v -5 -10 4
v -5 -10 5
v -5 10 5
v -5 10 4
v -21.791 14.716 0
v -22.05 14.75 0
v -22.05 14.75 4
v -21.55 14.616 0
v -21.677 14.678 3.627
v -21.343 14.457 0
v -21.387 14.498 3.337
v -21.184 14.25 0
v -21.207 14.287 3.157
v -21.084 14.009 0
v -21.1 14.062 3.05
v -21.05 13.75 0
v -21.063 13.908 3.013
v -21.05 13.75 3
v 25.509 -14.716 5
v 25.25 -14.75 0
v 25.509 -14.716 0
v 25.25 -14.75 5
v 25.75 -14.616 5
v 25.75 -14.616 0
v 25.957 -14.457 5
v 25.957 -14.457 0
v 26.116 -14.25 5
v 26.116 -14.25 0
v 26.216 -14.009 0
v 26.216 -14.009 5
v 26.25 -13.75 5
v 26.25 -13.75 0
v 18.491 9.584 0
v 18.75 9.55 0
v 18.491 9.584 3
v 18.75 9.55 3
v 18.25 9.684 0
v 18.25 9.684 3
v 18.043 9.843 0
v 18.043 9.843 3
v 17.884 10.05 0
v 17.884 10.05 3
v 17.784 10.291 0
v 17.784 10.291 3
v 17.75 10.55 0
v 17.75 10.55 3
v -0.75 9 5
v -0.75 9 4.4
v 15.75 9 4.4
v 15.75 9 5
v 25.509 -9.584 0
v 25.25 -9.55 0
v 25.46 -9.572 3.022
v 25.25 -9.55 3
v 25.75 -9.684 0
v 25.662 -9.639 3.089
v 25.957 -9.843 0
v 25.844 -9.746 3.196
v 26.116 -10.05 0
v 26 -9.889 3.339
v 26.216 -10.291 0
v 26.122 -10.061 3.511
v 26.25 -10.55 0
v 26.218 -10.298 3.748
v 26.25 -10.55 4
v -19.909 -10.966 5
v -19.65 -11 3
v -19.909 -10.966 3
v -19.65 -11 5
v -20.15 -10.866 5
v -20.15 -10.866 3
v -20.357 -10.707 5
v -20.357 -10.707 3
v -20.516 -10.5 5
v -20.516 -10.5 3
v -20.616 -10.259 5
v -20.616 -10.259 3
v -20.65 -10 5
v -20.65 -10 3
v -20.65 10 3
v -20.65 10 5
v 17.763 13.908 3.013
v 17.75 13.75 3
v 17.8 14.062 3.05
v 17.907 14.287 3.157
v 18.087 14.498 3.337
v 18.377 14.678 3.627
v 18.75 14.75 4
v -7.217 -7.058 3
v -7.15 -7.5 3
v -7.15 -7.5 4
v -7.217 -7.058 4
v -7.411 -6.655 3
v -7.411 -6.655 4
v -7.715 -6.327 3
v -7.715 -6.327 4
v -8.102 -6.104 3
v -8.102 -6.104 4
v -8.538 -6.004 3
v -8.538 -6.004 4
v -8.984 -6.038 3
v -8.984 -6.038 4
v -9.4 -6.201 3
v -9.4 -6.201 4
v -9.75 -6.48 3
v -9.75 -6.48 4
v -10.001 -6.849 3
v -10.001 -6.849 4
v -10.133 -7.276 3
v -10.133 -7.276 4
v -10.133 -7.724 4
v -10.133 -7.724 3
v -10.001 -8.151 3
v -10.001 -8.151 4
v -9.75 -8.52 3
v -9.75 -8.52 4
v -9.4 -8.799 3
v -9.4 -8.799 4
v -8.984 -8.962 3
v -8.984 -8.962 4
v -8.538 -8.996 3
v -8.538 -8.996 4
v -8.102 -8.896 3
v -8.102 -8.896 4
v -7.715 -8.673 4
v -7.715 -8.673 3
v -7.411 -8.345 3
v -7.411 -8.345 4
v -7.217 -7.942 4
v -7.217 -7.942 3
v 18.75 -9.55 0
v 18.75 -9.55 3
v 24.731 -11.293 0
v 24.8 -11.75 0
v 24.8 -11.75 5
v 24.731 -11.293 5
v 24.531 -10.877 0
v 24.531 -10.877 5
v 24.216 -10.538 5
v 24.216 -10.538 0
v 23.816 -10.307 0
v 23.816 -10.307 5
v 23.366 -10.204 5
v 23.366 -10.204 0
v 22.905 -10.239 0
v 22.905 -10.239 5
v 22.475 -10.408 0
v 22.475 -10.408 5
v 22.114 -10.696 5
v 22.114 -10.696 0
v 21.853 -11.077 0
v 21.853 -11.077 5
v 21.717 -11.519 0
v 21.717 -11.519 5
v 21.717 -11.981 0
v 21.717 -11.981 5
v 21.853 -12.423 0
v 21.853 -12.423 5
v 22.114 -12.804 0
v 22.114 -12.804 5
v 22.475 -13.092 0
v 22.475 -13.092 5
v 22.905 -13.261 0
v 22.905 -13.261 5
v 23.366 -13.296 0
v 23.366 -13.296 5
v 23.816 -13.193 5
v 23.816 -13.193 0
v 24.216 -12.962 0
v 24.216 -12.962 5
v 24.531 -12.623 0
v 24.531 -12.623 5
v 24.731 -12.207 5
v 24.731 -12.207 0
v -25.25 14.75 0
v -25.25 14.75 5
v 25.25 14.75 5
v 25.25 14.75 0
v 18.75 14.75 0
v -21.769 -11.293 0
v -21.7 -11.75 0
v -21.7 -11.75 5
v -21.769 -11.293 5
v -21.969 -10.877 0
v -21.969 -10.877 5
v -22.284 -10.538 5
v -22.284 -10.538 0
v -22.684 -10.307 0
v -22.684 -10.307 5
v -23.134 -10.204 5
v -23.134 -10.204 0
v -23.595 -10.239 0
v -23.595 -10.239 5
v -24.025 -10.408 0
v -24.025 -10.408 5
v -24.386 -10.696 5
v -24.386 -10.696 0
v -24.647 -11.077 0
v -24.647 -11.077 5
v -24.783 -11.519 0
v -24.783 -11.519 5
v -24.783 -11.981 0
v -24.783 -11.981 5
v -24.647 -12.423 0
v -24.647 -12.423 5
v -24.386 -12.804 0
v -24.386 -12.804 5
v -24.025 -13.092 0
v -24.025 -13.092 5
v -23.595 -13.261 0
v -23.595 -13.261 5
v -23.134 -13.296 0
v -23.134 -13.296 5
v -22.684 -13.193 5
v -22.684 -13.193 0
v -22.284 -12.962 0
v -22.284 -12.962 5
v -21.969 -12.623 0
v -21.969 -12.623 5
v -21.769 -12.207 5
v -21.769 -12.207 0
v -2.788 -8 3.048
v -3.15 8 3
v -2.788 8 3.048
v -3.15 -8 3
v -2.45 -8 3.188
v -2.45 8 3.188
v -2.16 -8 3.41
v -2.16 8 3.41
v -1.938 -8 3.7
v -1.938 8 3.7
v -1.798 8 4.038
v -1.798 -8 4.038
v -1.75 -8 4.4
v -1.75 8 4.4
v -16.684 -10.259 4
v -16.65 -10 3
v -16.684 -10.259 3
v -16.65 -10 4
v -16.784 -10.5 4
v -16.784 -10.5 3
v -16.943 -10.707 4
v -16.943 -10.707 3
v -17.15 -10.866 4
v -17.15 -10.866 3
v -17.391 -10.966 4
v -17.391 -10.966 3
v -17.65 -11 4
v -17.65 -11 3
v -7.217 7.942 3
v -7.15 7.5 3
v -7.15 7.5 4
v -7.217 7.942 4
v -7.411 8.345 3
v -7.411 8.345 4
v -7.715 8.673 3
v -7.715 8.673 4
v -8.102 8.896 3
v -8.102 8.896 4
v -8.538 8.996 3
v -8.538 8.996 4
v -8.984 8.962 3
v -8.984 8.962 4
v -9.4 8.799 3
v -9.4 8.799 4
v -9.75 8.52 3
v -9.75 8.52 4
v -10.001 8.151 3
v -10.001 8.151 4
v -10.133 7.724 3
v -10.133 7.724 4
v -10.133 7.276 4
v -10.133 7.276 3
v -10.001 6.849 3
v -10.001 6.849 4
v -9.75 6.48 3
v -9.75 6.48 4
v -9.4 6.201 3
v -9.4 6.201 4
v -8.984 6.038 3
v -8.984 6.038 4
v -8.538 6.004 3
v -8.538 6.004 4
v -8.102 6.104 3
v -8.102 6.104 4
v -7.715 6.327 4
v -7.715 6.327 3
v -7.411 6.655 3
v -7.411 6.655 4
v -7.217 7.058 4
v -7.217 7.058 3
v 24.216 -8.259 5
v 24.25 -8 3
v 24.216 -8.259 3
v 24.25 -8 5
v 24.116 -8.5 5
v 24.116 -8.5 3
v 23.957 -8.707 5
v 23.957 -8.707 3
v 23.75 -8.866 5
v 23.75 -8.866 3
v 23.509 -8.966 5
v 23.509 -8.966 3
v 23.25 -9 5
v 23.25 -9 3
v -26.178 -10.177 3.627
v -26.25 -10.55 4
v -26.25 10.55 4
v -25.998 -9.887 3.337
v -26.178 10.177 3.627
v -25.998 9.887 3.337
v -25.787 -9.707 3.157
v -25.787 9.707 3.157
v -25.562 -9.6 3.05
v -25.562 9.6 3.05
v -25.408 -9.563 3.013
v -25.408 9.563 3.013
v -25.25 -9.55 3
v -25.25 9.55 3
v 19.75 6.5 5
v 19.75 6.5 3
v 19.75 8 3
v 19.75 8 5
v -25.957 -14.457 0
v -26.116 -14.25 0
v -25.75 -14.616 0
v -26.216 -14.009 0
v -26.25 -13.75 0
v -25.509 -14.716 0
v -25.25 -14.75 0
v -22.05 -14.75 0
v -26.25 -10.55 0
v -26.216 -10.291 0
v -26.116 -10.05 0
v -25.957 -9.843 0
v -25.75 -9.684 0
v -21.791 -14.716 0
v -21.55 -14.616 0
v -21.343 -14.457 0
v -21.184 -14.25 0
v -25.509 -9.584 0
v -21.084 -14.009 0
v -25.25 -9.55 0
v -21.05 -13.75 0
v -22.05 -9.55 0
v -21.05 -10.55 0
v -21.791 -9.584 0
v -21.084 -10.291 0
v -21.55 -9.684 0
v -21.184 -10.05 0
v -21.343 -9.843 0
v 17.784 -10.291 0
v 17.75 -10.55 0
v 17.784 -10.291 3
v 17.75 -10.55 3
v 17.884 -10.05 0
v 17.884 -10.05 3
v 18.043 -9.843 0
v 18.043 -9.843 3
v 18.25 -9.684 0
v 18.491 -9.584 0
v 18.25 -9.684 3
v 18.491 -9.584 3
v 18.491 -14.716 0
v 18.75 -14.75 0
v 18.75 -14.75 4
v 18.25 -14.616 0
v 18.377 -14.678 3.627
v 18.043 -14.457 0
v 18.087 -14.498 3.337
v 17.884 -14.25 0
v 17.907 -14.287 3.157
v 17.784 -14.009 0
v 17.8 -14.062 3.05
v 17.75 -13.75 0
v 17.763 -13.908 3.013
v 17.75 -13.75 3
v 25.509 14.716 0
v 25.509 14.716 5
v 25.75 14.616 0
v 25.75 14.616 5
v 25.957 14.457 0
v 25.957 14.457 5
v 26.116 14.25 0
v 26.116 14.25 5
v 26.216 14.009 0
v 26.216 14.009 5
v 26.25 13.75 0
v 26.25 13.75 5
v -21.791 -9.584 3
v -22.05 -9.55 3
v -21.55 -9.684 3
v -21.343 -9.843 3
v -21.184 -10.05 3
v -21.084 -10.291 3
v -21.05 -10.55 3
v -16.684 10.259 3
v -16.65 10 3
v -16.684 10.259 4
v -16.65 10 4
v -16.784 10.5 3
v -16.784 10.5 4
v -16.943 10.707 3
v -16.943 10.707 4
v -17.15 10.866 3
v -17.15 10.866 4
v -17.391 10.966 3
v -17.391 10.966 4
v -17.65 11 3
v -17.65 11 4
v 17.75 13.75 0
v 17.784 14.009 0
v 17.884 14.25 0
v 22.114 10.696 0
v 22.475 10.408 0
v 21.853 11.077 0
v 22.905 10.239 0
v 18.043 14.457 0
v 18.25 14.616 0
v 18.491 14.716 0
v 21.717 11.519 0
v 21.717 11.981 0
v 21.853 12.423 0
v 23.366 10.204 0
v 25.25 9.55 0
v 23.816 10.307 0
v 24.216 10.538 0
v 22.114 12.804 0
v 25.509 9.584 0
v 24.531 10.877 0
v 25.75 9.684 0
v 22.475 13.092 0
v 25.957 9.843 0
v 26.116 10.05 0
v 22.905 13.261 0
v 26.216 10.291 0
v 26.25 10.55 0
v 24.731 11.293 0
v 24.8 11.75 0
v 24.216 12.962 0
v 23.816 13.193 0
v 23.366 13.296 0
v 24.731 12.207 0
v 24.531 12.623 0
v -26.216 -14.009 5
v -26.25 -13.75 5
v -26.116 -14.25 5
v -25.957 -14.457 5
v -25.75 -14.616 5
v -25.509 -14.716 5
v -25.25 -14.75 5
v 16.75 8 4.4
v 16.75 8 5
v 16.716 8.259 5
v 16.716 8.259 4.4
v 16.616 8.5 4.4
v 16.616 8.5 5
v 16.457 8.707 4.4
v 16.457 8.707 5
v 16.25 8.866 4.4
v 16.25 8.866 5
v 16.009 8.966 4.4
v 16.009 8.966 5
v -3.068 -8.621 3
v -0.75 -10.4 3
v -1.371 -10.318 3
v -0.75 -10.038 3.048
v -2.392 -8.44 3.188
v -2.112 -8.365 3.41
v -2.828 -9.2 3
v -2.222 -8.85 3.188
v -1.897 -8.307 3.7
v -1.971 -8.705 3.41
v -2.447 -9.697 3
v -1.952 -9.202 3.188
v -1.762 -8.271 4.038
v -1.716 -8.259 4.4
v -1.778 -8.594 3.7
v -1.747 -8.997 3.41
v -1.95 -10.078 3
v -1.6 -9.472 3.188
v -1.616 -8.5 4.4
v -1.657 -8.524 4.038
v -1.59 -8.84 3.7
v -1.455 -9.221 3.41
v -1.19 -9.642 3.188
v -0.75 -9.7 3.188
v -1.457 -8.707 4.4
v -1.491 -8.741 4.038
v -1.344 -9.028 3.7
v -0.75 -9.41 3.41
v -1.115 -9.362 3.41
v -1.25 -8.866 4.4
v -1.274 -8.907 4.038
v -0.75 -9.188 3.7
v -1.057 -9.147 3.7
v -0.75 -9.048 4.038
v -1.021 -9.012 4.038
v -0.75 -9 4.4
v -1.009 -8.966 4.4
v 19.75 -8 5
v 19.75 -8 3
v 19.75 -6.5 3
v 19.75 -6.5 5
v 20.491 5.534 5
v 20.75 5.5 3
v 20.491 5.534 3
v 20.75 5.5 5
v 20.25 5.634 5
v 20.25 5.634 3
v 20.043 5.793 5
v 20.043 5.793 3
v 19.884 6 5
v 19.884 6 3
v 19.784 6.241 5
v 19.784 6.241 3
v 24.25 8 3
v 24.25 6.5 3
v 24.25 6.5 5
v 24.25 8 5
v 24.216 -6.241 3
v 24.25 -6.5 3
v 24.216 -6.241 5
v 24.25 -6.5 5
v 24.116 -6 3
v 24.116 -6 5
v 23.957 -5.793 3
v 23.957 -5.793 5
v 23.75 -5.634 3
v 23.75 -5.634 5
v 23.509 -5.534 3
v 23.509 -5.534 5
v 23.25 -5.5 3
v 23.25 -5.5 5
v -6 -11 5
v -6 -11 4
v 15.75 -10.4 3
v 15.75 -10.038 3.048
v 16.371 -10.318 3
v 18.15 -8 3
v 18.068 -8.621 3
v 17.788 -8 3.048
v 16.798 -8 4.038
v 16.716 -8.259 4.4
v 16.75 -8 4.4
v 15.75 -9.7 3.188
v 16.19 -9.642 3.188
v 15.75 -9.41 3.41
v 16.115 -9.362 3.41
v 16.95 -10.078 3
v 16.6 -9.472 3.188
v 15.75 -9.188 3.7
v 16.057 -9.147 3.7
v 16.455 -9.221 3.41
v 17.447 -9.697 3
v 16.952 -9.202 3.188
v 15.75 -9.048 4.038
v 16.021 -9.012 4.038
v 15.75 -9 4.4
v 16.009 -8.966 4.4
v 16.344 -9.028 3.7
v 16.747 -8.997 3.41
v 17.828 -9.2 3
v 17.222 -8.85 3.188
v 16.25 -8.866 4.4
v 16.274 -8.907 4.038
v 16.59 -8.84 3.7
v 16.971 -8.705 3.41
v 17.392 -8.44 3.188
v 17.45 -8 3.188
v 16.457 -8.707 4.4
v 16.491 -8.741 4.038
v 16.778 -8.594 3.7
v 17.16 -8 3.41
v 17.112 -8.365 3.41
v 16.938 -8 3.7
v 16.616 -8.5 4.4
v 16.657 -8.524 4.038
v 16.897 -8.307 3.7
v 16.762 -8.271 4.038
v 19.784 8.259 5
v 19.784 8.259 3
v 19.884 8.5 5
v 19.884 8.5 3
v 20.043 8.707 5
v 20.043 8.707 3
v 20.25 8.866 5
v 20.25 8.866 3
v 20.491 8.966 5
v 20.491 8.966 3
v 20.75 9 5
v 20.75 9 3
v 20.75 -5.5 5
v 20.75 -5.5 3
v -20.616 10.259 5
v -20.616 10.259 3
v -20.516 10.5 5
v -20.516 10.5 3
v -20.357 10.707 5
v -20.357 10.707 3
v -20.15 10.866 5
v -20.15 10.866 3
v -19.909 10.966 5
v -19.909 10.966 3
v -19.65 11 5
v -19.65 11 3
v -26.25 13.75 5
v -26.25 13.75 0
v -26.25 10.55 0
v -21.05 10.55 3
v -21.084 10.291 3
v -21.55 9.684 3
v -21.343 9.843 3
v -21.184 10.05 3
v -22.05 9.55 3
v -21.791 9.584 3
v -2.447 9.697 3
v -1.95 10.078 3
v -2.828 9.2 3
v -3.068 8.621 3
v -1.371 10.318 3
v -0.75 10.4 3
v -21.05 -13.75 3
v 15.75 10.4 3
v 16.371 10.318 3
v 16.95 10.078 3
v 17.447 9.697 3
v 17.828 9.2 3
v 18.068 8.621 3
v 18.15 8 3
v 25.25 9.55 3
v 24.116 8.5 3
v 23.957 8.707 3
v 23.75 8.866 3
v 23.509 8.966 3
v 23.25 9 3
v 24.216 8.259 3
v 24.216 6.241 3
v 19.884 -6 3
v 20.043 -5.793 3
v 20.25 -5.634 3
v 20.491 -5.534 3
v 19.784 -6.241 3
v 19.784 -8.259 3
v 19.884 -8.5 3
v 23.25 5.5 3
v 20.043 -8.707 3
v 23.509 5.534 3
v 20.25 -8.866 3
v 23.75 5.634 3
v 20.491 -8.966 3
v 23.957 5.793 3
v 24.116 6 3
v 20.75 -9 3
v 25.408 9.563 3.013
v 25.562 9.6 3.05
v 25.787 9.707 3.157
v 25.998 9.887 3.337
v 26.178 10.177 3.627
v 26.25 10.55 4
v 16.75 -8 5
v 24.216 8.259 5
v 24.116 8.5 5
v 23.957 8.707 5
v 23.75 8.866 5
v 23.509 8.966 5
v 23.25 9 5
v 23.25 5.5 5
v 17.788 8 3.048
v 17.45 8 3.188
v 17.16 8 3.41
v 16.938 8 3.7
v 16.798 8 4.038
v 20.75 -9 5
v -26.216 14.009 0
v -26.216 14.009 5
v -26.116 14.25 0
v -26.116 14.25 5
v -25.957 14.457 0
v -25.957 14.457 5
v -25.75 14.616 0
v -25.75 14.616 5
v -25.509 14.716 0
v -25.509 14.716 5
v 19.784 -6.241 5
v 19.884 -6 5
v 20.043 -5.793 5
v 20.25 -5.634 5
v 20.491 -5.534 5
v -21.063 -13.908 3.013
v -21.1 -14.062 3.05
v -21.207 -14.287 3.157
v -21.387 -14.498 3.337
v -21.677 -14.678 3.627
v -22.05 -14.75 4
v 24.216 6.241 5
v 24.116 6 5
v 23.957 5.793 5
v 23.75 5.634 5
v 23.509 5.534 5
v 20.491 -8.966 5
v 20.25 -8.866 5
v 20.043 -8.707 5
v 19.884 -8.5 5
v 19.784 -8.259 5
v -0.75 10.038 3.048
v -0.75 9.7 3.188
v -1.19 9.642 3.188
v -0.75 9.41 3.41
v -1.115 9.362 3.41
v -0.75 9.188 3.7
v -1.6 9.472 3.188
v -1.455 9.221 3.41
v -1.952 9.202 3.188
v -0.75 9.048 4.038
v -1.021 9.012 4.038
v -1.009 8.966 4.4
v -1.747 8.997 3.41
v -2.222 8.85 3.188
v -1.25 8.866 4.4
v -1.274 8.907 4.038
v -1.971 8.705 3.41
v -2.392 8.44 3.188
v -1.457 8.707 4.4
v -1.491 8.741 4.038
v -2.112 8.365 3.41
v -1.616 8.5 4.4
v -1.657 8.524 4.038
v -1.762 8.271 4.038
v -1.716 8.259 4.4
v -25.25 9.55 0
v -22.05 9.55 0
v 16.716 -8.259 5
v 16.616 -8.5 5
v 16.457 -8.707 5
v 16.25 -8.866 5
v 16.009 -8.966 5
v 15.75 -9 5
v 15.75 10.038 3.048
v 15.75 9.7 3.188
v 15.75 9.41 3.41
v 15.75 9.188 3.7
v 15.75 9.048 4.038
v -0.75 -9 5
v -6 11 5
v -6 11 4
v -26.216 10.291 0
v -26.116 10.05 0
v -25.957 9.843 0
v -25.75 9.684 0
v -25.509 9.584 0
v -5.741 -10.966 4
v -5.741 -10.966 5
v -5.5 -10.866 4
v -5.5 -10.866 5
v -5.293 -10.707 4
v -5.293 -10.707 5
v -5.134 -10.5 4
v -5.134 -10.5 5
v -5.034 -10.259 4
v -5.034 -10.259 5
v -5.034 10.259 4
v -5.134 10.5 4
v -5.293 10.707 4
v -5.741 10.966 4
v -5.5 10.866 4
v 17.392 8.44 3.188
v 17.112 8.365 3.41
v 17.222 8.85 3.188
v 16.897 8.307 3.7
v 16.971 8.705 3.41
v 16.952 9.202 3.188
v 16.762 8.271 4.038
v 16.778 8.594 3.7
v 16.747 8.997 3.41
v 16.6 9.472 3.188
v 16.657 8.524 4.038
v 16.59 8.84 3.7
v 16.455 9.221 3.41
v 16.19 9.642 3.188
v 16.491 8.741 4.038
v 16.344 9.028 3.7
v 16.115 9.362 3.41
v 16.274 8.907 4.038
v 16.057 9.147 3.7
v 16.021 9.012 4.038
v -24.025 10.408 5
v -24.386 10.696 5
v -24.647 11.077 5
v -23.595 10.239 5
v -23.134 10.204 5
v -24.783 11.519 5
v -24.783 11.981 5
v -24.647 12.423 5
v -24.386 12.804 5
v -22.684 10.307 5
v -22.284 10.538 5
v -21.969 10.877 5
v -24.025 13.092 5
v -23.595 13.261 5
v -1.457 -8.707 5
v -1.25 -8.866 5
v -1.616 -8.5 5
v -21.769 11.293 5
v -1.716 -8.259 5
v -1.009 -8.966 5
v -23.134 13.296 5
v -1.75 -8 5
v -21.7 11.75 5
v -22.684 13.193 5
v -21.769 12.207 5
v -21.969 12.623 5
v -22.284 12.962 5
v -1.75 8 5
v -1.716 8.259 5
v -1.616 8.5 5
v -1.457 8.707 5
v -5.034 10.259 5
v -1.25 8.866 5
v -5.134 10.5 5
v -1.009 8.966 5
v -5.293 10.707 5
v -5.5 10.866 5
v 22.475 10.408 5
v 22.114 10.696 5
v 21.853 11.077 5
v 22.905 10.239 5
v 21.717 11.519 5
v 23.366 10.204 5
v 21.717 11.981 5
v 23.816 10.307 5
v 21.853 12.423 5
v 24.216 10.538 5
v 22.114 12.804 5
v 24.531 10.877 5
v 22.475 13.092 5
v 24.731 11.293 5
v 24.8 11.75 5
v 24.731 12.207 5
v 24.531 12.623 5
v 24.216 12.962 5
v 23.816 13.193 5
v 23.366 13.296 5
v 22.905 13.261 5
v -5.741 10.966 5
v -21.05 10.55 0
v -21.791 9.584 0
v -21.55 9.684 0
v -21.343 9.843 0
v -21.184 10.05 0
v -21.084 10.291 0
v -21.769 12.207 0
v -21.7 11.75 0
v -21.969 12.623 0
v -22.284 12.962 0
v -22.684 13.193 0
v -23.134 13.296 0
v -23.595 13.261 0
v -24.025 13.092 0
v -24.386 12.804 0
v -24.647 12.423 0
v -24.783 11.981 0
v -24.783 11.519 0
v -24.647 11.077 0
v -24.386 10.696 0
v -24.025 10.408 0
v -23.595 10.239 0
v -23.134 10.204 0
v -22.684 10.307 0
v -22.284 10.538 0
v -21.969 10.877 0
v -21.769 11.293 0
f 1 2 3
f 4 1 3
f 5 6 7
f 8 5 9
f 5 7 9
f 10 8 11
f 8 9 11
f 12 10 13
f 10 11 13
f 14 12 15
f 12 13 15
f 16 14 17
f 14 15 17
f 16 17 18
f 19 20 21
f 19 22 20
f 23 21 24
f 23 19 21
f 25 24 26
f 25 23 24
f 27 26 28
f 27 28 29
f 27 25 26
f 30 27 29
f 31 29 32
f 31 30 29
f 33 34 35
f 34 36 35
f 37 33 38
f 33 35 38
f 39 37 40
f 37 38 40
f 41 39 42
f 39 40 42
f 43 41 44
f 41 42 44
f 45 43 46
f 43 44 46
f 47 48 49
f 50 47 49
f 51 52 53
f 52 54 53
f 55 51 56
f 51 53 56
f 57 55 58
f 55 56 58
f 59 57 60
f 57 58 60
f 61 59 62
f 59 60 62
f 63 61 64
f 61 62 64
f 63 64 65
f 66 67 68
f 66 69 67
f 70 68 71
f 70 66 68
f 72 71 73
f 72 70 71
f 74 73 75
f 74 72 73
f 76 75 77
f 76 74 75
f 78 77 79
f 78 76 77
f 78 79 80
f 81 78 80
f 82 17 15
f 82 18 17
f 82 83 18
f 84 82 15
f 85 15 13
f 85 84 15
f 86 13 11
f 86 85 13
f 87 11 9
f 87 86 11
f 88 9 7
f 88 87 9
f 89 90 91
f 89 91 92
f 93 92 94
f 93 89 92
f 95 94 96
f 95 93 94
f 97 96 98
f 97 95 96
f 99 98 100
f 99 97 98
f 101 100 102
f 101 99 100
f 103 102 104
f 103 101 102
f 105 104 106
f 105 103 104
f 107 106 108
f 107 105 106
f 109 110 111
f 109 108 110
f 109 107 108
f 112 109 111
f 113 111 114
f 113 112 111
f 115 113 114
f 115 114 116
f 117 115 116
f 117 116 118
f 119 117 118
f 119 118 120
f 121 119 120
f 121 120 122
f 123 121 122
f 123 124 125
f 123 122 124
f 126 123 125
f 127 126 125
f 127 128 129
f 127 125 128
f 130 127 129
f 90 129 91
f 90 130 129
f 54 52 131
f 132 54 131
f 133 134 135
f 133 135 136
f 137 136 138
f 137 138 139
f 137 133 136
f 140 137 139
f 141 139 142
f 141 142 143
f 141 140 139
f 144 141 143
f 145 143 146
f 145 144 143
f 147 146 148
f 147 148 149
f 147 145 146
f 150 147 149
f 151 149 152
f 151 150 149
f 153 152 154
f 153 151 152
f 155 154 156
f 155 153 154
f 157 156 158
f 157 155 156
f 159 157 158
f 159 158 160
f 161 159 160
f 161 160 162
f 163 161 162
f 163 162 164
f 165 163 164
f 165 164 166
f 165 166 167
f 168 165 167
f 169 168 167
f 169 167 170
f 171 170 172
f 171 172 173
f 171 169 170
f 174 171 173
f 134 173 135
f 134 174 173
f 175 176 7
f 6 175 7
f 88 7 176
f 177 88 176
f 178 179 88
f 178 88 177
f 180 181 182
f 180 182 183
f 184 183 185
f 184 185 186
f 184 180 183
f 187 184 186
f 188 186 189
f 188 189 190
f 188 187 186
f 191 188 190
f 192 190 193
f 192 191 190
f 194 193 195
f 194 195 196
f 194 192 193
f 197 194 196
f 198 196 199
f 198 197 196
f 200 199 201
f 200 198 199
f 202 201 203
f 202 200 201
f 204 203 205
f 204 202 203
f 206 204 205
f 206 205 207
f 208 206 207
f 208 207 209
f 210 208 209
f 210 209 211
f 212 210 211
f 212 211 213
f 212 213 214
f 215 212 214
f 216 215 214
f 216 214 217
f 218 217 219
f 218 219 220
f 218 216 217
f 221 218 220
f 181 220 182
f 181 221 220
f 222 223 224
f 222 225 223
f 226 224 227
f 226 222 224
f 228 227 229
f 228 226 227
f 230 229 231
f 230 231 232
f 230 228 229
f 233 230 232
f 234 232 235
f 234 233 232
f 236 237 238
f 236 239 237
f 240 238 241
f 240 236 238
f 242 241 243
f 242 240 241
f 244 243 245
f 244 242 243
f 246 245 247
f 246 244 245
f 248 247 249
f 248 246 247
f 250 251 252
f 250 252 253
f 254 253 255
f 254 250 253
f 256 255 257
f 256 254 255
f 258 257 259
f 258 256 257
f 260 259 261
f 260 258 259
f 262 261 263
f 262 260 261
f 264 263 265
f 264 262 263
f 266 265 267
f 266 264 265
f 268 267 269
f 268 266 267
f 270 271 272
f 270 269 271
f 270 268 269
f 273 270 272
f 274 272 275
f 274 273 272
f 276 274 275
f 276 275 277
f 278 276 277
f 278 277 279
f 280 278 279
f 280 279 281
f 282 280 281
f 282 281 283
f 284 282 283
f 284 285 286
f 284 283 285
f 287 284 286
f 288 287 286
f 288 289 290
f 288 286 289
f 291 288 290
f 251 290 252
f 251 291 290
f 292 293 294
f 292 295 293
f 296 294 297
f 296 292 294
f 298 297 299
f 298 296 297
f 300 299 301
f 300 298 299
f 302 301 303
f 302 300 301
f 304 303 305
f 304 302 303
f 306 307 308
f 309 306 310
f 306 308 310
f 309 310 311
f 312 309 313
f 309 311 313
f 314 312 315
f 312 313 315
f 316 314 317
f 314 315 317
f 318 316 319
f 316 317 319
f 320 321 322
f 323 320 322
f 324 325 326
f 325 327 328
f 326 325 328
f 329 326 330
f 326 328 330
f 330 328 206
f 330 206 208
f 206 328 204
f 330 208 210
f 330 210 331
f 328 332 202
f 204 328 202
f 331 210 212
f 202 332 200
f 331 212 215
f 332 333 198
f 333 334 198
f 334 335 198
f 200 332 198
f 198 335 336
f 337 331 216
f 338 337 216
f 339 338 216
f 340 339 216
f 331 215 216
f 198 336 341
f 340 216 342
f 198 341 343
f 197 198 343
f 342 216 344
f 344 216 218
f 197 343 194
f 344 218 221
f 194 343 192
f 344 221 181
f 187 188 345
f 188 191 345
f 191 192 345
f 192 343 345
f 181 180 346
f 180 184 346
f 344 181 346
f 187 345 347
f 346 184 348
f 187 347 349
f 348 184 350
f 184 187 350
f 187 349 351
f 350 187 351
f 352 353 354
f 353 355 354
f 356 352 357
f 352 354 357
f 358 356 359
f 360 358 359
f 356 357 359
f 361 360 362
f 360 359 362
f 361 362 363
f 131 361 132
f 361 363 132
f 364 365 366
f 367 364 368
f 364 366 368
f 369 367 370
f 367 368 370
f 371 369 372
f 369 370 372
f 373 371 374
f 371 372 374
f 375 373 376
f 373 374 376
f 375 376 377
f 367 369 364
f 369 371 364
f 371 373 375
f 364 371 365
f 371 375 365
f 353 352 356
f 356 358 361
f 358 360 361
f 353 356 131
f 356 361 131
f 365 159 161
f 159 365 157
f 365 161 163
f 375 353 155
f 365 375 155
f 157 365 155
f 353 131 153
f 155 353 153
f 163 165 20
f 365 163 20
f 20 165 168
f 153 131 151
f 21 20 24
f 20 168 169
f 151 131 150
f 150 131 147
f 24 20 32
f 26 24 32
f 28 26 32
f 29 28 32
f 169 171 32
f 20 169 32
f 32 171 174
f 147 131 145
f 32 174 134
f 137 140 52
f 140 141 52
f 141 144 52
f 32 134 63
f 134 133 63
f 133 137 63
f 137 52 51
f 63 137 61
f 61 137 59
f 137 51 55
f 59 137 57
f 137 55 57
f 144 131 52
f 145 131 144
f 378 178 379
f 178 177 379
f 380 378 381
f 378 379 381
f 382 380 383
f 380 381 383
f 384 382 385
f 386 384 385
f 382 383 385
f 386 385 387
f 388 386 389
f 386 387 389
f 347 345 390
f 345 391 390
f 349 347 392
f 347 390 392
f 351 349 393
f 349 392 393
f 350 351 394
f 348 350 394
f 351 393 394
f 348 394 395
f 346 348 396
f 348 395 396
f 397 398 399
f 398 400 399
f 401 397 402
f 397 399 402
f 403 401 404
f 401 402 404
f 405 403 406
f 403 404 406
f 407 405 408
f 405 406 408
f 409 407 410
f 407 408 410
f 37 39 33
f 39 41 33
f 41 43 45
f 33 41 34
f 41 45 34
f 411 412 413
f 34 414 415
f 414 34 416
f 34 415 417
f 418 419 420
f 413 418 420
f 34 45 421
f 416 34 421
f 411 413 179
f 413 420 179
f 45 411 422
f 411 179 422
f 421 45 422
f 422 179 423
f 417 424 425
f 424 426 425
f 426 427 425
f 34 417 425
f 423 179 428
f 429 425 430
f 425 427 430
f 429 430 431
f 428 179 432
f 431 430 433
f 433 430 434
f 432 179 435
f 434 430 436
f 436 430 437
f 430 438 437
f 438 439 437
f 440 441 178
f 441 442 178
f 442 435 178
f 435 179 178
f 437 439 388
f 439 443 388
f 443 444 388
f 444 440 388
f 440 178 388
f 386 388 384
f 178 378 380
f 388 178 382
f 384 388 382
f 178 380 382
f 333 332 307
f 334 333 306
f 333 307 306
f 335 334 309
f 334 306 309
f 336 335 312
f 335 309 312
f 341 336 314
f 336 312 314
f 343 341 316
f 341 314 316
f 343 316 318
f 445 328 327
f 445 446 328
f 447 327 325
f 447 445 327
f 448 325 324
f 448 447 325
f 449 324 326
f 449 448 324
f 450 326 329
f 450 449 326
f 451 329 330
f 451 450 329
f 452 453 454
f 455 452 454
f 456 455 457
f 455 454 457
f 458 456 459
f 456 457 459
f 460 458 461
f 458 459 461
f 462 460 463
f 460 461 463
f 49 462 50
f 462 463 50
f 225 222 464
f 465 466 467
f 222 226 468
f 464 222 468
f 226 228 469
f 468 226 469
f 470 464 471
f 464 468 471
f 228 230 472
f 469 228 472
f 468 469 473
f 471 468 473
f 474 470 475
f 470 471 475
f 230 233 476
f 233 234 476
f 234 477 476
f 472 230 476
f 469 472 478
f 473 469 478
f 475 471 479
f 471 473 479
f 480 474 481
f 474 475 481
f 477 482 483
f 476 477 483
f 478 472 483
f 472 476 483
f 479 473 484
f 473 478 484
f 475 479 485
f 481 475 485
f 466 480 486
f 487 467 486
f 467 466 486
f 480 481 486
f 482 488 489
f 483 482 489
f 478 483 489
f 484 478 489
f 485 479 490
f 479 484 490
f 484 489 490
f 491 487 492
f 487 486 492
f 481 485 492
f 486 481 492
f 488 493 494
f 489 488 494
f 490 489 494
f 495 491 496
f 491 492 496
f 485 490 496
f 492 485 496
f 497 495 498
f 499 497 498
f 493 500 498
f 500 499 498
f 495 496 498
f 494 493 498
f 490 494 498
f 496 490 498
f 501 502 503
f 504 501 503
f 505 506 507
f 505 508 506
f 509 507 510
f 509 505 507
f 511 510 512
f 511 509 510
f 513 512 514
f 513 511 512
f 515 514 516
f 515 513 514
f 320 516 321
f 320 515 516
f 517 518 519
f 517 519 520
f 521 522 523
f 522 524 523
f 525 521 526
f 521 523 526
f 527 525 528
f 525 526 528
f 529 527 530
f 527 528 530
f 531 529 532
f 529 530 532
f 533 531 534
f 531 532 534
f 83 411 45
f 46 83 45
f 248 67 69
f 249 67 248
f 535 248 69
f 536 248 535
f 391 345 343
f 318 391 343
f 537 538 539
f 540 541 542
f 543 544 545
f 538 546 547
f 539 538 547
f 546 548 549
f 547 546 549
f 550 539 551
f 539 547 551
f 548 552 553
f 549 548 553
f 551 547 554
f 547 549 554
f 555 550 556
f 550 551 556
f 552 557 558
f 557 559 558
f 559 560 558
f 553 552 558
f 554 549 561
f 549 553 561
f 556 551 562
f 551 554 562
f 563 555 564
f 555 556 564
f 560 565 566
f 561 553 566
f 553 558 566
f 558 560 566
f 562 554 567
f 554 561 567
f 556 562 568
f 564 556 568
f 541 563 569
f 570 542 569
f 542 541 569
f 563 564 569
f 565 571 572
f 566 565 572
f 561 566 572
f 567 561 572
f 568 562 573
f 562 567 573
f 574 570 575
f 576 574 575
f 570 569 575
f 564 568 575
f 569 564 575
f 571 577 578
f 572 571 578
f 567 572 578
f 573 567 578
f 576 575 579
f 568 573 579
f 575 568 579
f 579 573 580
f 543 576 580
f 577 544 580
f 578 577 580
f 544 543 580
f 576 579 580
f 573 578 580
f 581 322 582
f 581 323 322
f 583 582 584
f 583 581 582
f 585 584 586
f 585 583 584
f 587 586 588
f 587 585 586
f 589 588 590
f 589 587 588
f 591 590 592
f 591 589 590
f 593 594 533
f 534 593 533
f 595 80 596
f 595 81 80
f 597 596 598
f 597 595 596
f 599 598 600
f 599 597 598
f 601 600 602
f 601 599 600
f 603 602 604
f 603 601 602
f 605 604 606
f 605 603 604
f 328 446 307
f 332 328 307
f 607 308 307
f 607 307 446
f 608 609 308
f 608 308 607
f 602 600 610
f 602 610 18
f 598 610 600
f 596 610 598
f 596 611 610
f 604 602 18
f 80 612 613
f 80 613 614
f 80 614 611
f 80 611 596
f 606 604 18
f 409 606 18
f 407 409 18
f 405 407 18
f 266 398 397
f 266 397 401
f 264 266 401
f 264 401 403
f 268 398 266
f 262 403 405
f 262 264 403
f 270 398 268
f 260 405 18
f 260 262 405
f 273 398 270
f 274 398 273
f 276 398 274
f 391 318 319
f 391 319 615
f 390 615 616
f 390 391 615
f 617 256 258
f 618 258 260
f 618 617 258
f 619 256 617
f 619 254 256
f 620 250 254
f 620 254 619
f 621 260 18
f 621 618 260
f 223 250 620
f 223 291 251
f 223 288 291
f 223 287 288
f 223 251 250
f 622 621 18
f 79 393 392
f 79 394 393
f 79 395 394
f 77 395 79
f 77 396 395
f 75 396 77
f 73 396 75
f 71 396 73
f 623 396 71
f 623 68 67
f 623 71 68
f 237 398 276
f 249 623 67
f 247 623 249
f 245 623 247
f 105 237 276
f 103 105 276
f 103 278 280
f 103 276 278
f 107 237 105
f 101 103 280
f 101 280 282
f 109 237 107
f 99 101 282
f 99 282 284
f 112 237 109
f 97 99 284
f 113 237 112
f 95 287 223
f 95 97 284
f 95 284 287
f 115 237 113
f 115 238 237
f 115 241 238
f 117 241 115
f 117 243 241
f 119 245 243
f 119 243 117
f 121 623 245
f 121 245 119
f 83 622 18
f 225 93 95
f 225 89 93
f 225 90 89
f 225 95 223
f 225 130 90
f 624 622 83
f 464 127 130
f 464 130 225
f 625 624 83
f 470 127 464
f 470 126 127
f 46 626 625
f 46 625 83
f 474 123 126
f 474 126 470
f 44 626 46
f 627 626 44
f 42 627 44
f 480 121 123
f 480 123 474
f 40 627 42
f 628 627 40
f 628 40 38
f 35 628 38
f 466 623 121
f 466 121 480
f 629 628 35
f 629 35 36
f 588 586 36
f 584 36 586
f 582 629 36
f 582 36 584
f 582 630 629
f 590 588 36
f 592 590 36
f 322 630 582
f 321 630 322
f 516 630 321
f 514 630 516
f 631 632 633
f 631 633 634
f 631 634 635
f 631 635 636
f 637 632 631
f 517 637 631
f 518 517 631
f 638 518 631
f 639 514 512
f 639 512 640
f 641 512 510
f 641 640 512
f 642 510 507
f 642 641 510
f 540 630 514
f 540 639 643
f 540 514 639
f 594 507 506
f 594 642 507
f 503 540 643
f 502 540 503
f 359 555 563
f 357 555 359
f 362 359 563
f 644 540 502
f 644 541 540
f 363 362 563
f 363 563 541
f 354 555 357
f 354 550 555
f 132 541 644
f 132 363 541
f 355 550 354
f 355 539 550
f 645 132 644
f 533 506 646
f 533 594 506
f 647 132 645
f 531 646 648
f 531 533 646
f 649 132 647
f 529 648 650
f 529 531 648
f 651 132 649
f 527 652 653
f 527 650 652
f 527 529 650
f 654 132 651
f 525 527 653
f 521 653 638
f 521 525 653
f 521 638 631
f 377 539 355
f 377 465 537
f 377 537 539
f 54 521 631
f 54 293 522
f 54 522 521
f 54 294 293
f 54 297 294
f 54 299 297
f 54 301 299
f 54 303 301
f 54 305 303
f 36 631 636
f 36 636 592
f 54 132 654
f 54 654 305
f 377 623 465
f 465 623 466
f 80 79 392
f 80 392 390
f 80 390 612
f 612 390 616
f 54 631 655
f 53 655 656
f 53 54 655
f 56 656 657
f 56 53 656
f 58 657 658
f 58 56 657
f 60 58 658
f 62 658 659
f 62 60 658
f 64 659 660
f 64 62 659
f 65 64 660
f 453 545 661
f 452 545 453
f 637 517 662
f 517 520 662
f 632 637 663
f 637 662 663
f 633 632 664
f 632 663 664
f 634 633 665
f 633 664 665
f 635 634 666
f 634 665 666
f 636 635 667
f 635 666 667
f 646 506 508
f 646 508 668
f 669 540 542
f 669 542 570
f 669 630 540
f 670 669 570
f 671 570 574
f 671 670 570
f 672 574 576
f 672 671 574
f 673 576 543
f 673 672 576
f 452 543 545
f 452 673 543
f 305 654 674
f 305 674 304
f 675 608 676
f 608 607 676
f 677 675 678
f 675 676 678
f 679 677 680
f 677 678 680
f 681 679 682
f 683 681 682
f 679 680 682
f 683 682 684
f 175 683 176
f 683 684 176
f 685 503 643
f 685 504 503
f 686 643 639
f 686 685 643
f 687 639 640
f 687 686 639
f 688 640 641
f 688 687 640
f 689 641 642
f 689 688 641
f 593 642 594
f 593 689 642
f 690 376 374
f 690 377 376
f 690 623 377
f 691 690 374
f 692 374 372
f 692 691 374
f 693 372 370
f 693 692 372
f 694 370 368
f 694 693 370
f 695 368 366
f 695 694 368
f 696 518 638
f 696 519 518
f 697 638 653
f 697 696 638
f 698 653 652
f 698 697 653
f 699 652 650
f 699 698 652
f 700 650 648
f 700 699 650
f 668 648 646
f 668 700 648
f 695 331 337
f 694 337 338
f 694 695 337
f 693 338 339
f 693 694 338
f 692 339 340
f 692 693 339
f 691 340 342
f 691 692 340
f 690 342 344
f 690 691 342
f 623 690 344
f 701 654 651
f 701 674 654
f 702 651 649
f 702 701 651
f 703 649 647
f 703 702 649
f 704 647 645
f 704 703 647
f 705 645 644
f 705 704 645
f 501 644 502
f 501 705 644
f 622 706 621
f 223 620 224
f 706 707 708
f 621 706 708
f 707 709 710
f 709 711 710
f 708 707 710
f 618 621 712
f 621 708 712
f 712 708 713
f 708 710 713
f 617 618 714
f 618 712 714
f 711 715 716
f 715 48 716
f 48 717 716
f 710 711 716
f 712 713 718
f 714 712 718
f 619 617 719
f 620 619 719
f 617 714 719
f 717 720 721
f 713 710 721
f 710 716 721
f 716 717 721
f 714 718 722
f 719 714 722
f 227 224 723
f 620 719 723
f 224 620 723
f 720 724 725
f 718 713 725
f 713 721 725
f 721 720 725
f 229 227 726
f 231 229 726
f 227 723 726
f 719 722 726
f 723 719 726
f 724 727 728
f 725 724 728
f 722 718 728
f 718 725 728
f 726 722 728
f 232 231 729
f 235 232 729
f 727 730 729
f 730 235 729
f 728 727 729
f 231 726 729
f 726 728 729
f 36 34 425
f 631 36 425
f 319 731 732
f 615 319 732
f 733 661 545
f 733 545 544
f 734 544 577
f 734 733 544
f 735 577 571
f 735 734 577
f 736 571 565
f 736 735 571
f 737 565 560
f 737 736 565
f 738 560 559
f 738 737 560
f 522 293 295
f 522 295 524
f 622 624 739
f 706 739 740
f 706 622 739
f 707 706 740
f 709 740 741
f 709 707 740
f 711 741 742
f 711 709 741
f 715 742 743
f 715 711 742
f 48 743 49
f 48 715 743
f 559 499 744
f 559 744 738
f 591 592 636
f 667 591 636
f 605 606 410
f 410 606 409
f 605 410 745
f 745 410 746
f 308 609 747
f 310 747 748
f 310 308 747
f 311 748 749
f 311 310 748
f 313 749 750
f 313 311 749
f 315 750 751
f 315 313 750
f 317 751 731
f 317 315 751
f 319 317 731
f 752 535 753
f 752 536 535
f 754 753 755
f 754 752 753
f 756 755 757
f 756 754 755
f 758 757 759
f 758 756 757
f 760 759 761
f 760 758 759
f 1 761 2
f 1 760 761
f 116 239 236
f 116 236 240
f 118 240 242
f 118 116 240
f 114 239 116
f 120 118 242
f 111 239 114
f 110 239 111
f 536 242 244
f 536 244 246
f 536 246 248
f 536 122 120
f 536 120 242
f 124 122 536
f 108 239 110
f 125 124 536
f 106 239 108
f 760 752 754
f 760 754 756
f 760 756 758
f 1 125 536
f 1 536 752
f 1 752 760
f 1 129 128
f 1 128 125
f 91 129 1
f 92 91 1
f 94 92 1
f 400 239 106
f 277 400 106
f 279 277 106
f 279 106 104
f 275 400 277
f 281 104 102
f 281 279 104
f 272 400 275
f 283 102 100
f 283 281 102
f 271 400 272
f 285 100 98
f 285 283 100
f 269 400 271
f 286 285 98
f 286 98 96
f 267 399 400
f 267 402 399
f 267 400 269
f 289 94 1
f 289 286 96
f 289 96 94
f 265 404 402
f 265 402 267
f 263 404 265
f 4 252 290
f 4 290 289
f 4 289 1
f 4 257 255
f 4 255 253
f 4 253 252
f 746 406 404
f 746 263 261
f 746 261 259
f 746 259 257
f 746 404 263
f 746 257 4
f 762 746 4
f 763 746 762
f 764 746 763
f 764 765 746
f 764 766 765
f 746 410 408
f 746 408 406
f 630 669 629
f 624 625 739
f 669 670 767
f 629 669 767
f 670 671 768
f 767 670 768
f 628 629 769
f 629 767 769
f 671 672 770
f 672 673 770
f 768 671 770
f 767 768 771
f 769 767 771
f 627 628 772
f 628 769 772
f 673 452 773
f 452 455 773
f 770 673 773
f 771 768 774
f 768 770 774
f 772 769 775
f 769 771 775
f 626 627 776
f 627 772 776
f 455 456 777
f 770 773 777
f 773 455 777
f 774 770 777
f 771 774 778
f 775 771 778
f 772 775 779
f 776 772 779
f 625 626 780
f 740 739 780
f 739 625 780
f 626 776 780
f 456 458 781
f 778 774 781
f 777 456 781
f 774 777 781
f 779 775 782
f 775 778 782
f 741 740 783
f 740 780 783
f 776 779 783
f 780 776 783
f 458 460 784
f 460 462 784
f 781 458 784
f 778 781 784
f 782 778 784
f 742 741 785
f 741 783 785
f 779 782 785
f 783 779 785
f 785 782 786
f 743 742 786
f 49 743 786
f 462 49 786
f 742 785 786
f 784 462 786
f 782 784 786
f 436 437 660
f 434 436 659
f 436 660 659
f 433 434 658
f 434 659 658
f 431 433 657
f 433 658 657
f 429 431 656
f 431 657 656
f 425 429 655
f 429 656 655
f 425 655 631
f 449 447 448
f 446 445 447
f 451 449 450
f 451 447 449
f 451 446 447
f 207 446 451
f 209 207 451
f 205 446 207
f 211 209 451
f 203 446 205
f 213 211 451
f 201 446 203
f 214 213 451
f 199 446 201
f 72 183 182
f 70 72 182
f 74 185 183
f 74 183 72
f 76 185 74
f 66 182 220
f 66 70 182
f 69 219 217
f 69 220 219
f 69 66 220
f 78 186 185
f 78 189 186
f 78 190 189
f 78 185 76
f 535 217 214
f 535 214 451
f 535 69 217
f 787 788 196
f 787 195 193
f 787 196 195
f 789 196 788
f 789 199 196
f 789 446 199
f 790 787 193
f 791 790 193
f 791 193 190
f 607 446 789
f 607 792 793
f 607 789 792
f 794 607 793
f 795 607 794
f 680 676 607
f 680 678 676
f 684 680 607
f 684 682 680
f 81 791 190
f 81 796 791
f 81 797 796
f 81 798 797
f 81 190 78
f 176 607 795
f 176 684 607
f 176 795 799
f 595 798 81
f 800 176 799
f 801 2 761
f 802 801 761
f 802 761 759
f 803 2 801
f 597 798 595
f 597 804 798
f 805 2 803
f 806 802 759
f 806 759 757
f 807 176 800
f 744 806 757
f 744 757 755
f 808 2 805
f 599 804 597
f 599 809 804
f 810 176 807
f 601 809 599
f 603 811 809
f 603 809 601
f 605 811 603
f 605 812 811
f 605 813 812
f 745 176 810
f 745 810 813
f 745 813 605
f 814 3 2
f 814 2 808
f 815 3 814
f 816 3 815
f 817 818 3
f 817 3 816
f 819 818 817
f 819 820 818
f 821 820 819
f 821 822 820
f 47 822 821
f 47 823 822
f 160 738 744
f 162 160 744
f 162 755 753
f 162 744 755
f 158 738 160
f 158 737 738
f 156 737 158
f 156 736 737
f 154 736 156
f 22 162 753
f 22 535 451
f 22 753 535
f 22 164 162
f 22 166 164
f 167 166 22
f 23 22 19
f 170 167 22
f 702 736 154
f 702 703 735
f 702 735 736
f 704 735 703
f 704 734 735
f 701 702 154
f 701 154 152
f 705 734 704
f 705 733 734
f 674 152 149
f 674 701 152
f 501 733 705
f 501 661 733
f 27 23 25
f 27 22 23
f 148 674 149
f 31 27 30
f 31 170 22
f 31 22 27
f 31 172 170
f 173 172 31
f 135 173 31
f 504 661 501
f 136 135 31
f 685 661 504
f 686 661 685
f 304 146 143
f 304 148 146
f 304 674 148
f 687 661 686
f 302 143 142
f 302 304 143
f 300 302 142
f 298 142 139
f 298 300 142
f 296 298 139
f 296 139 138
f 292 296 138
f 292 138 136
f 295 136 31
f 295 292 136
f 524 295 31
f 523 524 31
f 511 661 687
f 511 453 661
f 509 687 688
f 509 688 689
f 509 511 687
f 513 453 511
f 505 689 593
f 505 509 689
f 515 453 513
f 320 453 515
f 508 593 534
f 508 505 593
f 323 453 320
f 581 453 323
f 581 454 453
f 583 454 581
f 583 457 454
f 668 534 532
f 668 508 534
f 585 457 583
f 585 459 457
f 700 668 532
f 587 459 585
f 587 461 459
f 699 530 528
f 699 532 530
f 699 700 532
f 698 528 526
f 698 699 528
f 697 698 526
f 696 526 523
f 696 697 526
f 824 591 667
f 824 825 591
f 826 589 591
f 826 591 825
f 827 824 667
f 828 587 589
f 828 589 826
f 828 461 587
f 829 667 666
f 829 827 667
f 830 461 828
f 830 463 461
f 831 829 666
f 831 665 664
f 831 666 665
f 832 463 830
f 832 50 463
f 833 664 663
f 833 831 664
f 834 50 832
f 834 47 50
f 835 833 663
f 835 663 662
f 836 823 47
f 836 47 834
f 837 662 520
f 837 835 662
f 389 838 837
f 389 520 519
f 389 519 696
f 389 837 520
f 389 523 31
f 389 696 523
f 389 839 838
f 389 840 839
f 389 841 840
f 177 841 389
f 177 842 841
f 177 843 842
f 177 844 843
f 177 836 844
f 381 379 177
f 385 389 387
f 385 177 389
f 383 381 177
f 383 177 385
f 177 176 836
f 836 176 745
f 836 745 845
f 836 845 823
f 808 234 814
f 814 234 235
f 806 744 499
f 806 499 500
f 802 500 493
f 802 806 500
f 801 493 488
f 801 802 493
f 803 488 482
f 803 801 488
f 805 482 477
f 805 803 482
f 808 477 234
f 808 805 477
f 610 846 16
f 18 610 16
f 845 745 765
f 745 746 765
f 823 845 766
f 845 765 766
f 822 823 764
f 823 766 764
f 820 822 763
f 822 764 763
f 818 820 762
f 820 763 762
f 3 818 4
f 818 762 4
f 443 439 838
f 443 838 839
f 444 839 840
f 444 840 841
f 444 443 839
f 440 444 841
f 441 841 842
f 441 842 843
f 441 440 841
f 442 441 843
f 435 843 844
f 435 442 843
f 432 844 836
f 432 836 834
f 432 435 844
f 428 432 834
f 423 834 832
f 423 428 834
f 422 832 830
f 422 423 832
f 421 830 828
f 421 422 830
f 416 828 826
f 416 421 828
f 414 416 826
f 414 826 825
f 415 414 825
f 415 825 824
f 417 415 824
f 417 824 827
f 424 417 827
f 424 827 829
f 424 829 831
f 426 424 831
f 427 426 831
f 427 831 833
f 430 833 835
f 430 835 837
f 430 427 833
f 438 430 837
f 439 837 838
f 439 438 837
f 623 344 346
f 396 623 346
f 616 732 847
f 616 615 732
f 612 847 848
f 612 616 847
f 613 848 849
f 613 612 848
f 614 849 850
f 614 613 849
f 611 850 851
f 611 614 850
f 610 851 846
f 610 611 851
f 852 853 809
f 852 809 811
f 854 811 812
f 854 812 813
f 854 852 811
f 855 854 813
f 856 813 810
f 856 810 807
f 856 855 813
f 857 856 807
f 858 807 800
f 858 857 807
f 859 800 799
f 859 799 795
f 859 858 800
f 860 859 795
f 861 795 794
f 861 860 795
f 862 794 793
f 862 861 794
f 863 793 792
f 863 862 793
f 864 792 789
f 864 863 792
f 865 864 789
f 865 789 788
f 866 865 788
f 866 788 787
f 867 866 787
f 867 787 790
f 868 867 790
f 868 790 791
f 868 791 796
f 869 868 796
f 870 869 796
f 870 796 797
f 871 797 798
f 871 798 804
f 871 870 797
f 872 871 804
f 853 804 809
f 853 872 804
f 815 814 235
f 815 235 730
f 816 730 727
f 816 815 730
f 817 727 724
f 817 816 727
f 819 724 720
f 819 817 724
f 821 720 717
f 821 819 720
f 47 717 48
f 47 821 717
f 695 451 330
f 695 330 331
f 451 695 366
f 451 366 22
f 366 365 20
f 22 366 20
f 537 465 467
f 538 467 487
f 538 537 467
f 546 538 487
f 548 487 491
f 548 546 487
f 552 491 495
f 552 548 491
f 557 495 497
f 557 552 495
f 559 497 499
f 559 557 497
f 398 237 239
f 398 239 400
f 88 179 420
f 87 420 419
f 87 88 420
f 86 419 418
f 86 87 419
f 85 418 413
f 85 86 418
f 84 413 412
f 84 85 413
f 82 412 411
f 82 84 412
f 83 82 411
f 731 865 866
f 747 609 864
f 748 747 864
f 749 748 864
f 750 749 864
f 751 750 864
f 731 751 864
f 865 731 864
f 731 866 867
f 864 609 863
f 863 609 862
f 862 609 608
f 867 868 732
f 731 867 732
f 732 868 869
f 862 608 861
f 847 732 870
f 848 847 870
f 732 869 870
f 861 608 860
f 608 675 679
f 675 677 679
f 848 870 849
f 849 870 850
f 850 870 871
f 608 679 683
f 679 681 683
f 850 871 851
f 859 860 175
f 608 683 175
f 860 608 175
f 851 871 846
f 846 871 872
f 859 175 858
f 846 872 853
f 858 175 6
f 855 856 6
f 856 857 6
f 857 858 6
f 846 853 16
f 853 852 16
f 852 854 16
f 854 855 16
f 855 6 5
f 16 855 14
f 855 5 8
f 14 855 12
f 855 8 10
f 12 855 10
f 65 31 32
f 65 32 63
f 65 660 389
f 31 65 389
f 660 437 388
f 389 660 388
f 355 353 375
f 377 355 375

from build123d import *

# Parameters (mm, degrees)
SKETCH039_W     = 52.5
SKETCH039_H     = 29.5
SKETCH039_R     = 1.55
SKETCH039_R_2   = 1.5
SKETCH039_W_2   = 18.5
SKETCH039_H_2   = 18
SKETCH039_W_3   = 4
SKETCH039_H_3   = 22
SKETCH039_W_4   = 4.5
SKETCH039_H_4   = 3.5
PAD009_DEPTH    = 5
SKETCH040_W     = 11.65
SKETCH040_H     = 22
POCKET028_DEPTH = 1
POCKET029_DEPTH = 3
FILLET014_R     = 1
FILLET015_R     = 1.4


with BuildPart() as part:
    # Sketch039 → Pad009 (new body)
    with BuildSketch(Plane.XY):
        Rectangle(SKETCH039_W, SKETCH039_H)
        with Locations((-23.25, 11.75)):
            Circle(SKETCH039_R, mode=Mode.SUBTRACT)
        with Locations((23.25, 11.75)):
            Circle(SKETCH039_R, mode=Mode.SUBTRACT)
        with Locations((-23.25, -11.75)):
            Circle(SKETCH039_R, mode=Mode.SUBTRACT)
        with Locations((23.25, -11.75)):
            Circle(SKETCH039_R, mode=Mode.SUBTRACT)
        with Locations((-8.65, 7.5)):
            Circle(SKETCH039_R_2, mode=Mode.SUBTRACT)
        with Locations((-8.65, -7.5)):
            Circle(SKETCH039_R_2, mode=Mode.SUBTRACT)
        with Locations((7.5, 0)):
            Rectangle(SKETCH039_W_2, SKETCH039_H_2, mode=Mode.SUBTRACT)
        with Locations((-18.65, 0)):
            Rectangle(SKETCH039_W_3, SKETCH039_H_3, mode=Mode.SUBTRACT)
        with Locations((22, 7.25)):
            Rectangle(SKETCH039_W_4, SKETCH039_H_4, mode=Mode.SUBTRACT)
        with Locations((22, -7.25)):
            Rectangle(SKETCH039_W_4, SKETCH039_H_4, mode=Mode.SUBTRACT)
    extrude(amount=PAD009_DEPTH)

    # Sketch040 (on Face28 of Pad009) → Pocket028 (cut)
    with BuildSketch(Plane.XY.offset(5)):
        with Locations((-10.825, 0)):
            Rectangle(SKETCH040_W, SKETCH040_H)
    extrude(amount=-POCKET028_DEPTH, mode=Mode.SUBTRACT)

    # Sketch041 (on Face4 of Pocket028) → Pocket029 (cut)
    with BuildSketch(Plane(origin=(0, 0, 0), x_dir=(1, 0, 0), z_dir=(0, 0, -1))):
        Polygon((-21.05, 14.75), (-21.05, 9.55), (-26.25, 9.55), (-26.25, -9.55), (-21.05, -9.55), (-21.05, -14.75), (17.75, -14.75), (17.75, -9.55), (26.25, -9.55), (26.25, 9.55), (17.75, 9.55), (17.75, 14.75), align=None)
    extrude(amount=-POCKET029_DEPTH, mode=Mode.SUBTRACT)

    # Fillet014
    fillet014_edges = [part.edges().sort_by_distance(p)[0] for p in [
        (-26.25, -14.75, 2.5),
        (-26.25, 14.75, 2.5),
        (26.25, -14.75, 2.5),
        (17.75, -9.55, 1.5),
        (17.75, 9.55, 1.5),
        (-21.05, -9.55, 1.5),
        (-21.05, 9.55, 1.5),
        (26.25, 14.75, 2.5),
        (16.75, -9, 4),
        (-1.75, -9, 4),
        (16.75, 9, 4),
        (24.25, -5.5, 4),
        (24.25, 9, 4),
        (-16.65, 11, 3.5),
        (-20.65, -11, 4),
        (19.75, -9, 4),
        (19.75, 5.5, 4),
        (-20.65, 11, 4),
        (-1.75, 9, 4),
        (19.75, 9, 4),
        (19.75, -5.5, 4),
        (-16.65, -11, 3.5),
        (24.25, 5.5, 4),
        (24.25, -9, 4),
        (-5, -11, 4.5),
        (-5, 11, 4.5),
        (-21.05, -14.75, 1.5),
        (17.75, -14.75, 1.5),
        (26.25, -9.55, 1.5),
        (26.25, 9.55, 1.5),
        (-1.65, -14.75, 3),
        (17.75, 14.75, 1.5),
        (-21.05, 14.75, 1.5),
        (-26.25, -9.55, 1.5),
        (-26.25, 9.55, 1.5),
        (-26.25, 0, 3),
        (-1.65, 14.75, 3),
        (26.25, 0, 3),
    ]]
    fillet(fillet014_edges, radius=FILLET014_R)

    # Fillet015
    fillet015_edges = [part.edges().sort_by_distance(p)[0] for p in [
        (-1.75, 0, 3),
        (7.5, 9, 3),
        (16.75, 0, 3),
        (7.5, -9, 3),
    ]]
    fillet(fillet015_edges, radius=FILLET015_R)


solid = part.part
